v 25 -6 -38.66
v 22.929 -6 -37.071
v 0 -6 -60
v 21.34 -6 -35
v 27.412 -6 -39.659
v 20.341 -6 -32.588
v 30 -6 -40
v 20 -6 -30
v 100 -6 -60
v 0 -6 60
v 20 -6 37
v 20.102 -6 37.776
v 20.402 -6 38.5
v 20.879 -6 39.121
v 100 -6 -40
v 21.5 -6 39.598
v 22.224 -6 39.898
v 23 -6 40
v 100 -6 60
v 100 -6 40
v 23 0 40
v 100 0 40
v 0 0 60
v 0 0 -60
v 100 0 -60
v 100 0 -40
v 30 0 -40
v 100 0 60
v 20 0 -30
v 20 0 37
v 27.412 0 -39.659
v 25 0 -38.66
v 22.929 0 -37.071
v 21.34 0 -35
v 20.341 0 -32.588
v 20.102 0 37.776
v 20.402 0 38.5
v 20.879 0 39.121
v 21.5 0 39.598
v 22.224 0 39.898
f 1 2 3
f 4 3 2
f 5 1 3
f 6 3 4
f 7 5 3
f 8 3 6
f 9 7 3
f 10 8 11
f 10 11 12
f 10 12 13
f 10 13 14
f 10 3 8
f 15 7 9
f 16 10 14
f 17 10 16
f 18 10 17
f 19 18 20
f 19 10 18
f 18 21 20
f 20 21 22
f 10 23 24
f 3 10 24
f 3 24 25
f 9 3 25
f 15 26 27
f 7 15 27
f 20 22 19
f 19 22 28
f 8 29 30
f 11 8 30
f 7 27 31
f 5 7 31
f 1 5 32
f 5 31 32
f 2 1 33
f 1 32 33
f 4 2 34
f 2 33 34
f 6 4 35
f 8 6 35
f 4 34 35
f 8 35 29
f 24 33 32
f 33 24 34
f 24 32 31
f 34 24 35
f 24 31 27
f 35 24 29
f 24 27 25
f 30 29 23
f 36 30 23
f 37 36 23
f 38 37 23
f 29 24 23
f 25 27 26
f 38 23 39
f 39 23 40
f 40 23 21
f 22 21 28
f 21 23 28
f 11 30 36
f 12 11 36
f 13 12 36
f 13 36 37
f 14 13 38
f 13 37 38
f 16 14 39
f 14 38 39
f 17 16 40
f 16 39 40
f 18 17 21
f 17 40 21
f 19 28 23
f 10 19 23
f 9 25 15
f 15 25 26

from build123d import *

# Parameters (mm, degrees)
F1_DEPTH = 6


with BuildPart() as f1:
    # F0 (on Front) → F1 (new body)
    with BuildSketch(Plane.XZ):
        with BuildLine():
            Line((100, 60), (0, 60))
            Line((0, 60), (0, -60))
            Line((0, -60), (100, -60))
            Line((100, -60), (100, -40))
            Line((100, -40), (30, -40))
            ThreePointArc((30, -40), (22.928932, -37.071068), (20, -30))
            Line((20, -30), (20, 37))
            ThreePointArc((20, 37), (20.87868, 39.12132), (23, 40))
            Line((23, 40), (100, 40))
            Line((100, 40), (100, 60))
        make_face()
    extrude(amount=F1_DEPTH)


solid = f1.part
